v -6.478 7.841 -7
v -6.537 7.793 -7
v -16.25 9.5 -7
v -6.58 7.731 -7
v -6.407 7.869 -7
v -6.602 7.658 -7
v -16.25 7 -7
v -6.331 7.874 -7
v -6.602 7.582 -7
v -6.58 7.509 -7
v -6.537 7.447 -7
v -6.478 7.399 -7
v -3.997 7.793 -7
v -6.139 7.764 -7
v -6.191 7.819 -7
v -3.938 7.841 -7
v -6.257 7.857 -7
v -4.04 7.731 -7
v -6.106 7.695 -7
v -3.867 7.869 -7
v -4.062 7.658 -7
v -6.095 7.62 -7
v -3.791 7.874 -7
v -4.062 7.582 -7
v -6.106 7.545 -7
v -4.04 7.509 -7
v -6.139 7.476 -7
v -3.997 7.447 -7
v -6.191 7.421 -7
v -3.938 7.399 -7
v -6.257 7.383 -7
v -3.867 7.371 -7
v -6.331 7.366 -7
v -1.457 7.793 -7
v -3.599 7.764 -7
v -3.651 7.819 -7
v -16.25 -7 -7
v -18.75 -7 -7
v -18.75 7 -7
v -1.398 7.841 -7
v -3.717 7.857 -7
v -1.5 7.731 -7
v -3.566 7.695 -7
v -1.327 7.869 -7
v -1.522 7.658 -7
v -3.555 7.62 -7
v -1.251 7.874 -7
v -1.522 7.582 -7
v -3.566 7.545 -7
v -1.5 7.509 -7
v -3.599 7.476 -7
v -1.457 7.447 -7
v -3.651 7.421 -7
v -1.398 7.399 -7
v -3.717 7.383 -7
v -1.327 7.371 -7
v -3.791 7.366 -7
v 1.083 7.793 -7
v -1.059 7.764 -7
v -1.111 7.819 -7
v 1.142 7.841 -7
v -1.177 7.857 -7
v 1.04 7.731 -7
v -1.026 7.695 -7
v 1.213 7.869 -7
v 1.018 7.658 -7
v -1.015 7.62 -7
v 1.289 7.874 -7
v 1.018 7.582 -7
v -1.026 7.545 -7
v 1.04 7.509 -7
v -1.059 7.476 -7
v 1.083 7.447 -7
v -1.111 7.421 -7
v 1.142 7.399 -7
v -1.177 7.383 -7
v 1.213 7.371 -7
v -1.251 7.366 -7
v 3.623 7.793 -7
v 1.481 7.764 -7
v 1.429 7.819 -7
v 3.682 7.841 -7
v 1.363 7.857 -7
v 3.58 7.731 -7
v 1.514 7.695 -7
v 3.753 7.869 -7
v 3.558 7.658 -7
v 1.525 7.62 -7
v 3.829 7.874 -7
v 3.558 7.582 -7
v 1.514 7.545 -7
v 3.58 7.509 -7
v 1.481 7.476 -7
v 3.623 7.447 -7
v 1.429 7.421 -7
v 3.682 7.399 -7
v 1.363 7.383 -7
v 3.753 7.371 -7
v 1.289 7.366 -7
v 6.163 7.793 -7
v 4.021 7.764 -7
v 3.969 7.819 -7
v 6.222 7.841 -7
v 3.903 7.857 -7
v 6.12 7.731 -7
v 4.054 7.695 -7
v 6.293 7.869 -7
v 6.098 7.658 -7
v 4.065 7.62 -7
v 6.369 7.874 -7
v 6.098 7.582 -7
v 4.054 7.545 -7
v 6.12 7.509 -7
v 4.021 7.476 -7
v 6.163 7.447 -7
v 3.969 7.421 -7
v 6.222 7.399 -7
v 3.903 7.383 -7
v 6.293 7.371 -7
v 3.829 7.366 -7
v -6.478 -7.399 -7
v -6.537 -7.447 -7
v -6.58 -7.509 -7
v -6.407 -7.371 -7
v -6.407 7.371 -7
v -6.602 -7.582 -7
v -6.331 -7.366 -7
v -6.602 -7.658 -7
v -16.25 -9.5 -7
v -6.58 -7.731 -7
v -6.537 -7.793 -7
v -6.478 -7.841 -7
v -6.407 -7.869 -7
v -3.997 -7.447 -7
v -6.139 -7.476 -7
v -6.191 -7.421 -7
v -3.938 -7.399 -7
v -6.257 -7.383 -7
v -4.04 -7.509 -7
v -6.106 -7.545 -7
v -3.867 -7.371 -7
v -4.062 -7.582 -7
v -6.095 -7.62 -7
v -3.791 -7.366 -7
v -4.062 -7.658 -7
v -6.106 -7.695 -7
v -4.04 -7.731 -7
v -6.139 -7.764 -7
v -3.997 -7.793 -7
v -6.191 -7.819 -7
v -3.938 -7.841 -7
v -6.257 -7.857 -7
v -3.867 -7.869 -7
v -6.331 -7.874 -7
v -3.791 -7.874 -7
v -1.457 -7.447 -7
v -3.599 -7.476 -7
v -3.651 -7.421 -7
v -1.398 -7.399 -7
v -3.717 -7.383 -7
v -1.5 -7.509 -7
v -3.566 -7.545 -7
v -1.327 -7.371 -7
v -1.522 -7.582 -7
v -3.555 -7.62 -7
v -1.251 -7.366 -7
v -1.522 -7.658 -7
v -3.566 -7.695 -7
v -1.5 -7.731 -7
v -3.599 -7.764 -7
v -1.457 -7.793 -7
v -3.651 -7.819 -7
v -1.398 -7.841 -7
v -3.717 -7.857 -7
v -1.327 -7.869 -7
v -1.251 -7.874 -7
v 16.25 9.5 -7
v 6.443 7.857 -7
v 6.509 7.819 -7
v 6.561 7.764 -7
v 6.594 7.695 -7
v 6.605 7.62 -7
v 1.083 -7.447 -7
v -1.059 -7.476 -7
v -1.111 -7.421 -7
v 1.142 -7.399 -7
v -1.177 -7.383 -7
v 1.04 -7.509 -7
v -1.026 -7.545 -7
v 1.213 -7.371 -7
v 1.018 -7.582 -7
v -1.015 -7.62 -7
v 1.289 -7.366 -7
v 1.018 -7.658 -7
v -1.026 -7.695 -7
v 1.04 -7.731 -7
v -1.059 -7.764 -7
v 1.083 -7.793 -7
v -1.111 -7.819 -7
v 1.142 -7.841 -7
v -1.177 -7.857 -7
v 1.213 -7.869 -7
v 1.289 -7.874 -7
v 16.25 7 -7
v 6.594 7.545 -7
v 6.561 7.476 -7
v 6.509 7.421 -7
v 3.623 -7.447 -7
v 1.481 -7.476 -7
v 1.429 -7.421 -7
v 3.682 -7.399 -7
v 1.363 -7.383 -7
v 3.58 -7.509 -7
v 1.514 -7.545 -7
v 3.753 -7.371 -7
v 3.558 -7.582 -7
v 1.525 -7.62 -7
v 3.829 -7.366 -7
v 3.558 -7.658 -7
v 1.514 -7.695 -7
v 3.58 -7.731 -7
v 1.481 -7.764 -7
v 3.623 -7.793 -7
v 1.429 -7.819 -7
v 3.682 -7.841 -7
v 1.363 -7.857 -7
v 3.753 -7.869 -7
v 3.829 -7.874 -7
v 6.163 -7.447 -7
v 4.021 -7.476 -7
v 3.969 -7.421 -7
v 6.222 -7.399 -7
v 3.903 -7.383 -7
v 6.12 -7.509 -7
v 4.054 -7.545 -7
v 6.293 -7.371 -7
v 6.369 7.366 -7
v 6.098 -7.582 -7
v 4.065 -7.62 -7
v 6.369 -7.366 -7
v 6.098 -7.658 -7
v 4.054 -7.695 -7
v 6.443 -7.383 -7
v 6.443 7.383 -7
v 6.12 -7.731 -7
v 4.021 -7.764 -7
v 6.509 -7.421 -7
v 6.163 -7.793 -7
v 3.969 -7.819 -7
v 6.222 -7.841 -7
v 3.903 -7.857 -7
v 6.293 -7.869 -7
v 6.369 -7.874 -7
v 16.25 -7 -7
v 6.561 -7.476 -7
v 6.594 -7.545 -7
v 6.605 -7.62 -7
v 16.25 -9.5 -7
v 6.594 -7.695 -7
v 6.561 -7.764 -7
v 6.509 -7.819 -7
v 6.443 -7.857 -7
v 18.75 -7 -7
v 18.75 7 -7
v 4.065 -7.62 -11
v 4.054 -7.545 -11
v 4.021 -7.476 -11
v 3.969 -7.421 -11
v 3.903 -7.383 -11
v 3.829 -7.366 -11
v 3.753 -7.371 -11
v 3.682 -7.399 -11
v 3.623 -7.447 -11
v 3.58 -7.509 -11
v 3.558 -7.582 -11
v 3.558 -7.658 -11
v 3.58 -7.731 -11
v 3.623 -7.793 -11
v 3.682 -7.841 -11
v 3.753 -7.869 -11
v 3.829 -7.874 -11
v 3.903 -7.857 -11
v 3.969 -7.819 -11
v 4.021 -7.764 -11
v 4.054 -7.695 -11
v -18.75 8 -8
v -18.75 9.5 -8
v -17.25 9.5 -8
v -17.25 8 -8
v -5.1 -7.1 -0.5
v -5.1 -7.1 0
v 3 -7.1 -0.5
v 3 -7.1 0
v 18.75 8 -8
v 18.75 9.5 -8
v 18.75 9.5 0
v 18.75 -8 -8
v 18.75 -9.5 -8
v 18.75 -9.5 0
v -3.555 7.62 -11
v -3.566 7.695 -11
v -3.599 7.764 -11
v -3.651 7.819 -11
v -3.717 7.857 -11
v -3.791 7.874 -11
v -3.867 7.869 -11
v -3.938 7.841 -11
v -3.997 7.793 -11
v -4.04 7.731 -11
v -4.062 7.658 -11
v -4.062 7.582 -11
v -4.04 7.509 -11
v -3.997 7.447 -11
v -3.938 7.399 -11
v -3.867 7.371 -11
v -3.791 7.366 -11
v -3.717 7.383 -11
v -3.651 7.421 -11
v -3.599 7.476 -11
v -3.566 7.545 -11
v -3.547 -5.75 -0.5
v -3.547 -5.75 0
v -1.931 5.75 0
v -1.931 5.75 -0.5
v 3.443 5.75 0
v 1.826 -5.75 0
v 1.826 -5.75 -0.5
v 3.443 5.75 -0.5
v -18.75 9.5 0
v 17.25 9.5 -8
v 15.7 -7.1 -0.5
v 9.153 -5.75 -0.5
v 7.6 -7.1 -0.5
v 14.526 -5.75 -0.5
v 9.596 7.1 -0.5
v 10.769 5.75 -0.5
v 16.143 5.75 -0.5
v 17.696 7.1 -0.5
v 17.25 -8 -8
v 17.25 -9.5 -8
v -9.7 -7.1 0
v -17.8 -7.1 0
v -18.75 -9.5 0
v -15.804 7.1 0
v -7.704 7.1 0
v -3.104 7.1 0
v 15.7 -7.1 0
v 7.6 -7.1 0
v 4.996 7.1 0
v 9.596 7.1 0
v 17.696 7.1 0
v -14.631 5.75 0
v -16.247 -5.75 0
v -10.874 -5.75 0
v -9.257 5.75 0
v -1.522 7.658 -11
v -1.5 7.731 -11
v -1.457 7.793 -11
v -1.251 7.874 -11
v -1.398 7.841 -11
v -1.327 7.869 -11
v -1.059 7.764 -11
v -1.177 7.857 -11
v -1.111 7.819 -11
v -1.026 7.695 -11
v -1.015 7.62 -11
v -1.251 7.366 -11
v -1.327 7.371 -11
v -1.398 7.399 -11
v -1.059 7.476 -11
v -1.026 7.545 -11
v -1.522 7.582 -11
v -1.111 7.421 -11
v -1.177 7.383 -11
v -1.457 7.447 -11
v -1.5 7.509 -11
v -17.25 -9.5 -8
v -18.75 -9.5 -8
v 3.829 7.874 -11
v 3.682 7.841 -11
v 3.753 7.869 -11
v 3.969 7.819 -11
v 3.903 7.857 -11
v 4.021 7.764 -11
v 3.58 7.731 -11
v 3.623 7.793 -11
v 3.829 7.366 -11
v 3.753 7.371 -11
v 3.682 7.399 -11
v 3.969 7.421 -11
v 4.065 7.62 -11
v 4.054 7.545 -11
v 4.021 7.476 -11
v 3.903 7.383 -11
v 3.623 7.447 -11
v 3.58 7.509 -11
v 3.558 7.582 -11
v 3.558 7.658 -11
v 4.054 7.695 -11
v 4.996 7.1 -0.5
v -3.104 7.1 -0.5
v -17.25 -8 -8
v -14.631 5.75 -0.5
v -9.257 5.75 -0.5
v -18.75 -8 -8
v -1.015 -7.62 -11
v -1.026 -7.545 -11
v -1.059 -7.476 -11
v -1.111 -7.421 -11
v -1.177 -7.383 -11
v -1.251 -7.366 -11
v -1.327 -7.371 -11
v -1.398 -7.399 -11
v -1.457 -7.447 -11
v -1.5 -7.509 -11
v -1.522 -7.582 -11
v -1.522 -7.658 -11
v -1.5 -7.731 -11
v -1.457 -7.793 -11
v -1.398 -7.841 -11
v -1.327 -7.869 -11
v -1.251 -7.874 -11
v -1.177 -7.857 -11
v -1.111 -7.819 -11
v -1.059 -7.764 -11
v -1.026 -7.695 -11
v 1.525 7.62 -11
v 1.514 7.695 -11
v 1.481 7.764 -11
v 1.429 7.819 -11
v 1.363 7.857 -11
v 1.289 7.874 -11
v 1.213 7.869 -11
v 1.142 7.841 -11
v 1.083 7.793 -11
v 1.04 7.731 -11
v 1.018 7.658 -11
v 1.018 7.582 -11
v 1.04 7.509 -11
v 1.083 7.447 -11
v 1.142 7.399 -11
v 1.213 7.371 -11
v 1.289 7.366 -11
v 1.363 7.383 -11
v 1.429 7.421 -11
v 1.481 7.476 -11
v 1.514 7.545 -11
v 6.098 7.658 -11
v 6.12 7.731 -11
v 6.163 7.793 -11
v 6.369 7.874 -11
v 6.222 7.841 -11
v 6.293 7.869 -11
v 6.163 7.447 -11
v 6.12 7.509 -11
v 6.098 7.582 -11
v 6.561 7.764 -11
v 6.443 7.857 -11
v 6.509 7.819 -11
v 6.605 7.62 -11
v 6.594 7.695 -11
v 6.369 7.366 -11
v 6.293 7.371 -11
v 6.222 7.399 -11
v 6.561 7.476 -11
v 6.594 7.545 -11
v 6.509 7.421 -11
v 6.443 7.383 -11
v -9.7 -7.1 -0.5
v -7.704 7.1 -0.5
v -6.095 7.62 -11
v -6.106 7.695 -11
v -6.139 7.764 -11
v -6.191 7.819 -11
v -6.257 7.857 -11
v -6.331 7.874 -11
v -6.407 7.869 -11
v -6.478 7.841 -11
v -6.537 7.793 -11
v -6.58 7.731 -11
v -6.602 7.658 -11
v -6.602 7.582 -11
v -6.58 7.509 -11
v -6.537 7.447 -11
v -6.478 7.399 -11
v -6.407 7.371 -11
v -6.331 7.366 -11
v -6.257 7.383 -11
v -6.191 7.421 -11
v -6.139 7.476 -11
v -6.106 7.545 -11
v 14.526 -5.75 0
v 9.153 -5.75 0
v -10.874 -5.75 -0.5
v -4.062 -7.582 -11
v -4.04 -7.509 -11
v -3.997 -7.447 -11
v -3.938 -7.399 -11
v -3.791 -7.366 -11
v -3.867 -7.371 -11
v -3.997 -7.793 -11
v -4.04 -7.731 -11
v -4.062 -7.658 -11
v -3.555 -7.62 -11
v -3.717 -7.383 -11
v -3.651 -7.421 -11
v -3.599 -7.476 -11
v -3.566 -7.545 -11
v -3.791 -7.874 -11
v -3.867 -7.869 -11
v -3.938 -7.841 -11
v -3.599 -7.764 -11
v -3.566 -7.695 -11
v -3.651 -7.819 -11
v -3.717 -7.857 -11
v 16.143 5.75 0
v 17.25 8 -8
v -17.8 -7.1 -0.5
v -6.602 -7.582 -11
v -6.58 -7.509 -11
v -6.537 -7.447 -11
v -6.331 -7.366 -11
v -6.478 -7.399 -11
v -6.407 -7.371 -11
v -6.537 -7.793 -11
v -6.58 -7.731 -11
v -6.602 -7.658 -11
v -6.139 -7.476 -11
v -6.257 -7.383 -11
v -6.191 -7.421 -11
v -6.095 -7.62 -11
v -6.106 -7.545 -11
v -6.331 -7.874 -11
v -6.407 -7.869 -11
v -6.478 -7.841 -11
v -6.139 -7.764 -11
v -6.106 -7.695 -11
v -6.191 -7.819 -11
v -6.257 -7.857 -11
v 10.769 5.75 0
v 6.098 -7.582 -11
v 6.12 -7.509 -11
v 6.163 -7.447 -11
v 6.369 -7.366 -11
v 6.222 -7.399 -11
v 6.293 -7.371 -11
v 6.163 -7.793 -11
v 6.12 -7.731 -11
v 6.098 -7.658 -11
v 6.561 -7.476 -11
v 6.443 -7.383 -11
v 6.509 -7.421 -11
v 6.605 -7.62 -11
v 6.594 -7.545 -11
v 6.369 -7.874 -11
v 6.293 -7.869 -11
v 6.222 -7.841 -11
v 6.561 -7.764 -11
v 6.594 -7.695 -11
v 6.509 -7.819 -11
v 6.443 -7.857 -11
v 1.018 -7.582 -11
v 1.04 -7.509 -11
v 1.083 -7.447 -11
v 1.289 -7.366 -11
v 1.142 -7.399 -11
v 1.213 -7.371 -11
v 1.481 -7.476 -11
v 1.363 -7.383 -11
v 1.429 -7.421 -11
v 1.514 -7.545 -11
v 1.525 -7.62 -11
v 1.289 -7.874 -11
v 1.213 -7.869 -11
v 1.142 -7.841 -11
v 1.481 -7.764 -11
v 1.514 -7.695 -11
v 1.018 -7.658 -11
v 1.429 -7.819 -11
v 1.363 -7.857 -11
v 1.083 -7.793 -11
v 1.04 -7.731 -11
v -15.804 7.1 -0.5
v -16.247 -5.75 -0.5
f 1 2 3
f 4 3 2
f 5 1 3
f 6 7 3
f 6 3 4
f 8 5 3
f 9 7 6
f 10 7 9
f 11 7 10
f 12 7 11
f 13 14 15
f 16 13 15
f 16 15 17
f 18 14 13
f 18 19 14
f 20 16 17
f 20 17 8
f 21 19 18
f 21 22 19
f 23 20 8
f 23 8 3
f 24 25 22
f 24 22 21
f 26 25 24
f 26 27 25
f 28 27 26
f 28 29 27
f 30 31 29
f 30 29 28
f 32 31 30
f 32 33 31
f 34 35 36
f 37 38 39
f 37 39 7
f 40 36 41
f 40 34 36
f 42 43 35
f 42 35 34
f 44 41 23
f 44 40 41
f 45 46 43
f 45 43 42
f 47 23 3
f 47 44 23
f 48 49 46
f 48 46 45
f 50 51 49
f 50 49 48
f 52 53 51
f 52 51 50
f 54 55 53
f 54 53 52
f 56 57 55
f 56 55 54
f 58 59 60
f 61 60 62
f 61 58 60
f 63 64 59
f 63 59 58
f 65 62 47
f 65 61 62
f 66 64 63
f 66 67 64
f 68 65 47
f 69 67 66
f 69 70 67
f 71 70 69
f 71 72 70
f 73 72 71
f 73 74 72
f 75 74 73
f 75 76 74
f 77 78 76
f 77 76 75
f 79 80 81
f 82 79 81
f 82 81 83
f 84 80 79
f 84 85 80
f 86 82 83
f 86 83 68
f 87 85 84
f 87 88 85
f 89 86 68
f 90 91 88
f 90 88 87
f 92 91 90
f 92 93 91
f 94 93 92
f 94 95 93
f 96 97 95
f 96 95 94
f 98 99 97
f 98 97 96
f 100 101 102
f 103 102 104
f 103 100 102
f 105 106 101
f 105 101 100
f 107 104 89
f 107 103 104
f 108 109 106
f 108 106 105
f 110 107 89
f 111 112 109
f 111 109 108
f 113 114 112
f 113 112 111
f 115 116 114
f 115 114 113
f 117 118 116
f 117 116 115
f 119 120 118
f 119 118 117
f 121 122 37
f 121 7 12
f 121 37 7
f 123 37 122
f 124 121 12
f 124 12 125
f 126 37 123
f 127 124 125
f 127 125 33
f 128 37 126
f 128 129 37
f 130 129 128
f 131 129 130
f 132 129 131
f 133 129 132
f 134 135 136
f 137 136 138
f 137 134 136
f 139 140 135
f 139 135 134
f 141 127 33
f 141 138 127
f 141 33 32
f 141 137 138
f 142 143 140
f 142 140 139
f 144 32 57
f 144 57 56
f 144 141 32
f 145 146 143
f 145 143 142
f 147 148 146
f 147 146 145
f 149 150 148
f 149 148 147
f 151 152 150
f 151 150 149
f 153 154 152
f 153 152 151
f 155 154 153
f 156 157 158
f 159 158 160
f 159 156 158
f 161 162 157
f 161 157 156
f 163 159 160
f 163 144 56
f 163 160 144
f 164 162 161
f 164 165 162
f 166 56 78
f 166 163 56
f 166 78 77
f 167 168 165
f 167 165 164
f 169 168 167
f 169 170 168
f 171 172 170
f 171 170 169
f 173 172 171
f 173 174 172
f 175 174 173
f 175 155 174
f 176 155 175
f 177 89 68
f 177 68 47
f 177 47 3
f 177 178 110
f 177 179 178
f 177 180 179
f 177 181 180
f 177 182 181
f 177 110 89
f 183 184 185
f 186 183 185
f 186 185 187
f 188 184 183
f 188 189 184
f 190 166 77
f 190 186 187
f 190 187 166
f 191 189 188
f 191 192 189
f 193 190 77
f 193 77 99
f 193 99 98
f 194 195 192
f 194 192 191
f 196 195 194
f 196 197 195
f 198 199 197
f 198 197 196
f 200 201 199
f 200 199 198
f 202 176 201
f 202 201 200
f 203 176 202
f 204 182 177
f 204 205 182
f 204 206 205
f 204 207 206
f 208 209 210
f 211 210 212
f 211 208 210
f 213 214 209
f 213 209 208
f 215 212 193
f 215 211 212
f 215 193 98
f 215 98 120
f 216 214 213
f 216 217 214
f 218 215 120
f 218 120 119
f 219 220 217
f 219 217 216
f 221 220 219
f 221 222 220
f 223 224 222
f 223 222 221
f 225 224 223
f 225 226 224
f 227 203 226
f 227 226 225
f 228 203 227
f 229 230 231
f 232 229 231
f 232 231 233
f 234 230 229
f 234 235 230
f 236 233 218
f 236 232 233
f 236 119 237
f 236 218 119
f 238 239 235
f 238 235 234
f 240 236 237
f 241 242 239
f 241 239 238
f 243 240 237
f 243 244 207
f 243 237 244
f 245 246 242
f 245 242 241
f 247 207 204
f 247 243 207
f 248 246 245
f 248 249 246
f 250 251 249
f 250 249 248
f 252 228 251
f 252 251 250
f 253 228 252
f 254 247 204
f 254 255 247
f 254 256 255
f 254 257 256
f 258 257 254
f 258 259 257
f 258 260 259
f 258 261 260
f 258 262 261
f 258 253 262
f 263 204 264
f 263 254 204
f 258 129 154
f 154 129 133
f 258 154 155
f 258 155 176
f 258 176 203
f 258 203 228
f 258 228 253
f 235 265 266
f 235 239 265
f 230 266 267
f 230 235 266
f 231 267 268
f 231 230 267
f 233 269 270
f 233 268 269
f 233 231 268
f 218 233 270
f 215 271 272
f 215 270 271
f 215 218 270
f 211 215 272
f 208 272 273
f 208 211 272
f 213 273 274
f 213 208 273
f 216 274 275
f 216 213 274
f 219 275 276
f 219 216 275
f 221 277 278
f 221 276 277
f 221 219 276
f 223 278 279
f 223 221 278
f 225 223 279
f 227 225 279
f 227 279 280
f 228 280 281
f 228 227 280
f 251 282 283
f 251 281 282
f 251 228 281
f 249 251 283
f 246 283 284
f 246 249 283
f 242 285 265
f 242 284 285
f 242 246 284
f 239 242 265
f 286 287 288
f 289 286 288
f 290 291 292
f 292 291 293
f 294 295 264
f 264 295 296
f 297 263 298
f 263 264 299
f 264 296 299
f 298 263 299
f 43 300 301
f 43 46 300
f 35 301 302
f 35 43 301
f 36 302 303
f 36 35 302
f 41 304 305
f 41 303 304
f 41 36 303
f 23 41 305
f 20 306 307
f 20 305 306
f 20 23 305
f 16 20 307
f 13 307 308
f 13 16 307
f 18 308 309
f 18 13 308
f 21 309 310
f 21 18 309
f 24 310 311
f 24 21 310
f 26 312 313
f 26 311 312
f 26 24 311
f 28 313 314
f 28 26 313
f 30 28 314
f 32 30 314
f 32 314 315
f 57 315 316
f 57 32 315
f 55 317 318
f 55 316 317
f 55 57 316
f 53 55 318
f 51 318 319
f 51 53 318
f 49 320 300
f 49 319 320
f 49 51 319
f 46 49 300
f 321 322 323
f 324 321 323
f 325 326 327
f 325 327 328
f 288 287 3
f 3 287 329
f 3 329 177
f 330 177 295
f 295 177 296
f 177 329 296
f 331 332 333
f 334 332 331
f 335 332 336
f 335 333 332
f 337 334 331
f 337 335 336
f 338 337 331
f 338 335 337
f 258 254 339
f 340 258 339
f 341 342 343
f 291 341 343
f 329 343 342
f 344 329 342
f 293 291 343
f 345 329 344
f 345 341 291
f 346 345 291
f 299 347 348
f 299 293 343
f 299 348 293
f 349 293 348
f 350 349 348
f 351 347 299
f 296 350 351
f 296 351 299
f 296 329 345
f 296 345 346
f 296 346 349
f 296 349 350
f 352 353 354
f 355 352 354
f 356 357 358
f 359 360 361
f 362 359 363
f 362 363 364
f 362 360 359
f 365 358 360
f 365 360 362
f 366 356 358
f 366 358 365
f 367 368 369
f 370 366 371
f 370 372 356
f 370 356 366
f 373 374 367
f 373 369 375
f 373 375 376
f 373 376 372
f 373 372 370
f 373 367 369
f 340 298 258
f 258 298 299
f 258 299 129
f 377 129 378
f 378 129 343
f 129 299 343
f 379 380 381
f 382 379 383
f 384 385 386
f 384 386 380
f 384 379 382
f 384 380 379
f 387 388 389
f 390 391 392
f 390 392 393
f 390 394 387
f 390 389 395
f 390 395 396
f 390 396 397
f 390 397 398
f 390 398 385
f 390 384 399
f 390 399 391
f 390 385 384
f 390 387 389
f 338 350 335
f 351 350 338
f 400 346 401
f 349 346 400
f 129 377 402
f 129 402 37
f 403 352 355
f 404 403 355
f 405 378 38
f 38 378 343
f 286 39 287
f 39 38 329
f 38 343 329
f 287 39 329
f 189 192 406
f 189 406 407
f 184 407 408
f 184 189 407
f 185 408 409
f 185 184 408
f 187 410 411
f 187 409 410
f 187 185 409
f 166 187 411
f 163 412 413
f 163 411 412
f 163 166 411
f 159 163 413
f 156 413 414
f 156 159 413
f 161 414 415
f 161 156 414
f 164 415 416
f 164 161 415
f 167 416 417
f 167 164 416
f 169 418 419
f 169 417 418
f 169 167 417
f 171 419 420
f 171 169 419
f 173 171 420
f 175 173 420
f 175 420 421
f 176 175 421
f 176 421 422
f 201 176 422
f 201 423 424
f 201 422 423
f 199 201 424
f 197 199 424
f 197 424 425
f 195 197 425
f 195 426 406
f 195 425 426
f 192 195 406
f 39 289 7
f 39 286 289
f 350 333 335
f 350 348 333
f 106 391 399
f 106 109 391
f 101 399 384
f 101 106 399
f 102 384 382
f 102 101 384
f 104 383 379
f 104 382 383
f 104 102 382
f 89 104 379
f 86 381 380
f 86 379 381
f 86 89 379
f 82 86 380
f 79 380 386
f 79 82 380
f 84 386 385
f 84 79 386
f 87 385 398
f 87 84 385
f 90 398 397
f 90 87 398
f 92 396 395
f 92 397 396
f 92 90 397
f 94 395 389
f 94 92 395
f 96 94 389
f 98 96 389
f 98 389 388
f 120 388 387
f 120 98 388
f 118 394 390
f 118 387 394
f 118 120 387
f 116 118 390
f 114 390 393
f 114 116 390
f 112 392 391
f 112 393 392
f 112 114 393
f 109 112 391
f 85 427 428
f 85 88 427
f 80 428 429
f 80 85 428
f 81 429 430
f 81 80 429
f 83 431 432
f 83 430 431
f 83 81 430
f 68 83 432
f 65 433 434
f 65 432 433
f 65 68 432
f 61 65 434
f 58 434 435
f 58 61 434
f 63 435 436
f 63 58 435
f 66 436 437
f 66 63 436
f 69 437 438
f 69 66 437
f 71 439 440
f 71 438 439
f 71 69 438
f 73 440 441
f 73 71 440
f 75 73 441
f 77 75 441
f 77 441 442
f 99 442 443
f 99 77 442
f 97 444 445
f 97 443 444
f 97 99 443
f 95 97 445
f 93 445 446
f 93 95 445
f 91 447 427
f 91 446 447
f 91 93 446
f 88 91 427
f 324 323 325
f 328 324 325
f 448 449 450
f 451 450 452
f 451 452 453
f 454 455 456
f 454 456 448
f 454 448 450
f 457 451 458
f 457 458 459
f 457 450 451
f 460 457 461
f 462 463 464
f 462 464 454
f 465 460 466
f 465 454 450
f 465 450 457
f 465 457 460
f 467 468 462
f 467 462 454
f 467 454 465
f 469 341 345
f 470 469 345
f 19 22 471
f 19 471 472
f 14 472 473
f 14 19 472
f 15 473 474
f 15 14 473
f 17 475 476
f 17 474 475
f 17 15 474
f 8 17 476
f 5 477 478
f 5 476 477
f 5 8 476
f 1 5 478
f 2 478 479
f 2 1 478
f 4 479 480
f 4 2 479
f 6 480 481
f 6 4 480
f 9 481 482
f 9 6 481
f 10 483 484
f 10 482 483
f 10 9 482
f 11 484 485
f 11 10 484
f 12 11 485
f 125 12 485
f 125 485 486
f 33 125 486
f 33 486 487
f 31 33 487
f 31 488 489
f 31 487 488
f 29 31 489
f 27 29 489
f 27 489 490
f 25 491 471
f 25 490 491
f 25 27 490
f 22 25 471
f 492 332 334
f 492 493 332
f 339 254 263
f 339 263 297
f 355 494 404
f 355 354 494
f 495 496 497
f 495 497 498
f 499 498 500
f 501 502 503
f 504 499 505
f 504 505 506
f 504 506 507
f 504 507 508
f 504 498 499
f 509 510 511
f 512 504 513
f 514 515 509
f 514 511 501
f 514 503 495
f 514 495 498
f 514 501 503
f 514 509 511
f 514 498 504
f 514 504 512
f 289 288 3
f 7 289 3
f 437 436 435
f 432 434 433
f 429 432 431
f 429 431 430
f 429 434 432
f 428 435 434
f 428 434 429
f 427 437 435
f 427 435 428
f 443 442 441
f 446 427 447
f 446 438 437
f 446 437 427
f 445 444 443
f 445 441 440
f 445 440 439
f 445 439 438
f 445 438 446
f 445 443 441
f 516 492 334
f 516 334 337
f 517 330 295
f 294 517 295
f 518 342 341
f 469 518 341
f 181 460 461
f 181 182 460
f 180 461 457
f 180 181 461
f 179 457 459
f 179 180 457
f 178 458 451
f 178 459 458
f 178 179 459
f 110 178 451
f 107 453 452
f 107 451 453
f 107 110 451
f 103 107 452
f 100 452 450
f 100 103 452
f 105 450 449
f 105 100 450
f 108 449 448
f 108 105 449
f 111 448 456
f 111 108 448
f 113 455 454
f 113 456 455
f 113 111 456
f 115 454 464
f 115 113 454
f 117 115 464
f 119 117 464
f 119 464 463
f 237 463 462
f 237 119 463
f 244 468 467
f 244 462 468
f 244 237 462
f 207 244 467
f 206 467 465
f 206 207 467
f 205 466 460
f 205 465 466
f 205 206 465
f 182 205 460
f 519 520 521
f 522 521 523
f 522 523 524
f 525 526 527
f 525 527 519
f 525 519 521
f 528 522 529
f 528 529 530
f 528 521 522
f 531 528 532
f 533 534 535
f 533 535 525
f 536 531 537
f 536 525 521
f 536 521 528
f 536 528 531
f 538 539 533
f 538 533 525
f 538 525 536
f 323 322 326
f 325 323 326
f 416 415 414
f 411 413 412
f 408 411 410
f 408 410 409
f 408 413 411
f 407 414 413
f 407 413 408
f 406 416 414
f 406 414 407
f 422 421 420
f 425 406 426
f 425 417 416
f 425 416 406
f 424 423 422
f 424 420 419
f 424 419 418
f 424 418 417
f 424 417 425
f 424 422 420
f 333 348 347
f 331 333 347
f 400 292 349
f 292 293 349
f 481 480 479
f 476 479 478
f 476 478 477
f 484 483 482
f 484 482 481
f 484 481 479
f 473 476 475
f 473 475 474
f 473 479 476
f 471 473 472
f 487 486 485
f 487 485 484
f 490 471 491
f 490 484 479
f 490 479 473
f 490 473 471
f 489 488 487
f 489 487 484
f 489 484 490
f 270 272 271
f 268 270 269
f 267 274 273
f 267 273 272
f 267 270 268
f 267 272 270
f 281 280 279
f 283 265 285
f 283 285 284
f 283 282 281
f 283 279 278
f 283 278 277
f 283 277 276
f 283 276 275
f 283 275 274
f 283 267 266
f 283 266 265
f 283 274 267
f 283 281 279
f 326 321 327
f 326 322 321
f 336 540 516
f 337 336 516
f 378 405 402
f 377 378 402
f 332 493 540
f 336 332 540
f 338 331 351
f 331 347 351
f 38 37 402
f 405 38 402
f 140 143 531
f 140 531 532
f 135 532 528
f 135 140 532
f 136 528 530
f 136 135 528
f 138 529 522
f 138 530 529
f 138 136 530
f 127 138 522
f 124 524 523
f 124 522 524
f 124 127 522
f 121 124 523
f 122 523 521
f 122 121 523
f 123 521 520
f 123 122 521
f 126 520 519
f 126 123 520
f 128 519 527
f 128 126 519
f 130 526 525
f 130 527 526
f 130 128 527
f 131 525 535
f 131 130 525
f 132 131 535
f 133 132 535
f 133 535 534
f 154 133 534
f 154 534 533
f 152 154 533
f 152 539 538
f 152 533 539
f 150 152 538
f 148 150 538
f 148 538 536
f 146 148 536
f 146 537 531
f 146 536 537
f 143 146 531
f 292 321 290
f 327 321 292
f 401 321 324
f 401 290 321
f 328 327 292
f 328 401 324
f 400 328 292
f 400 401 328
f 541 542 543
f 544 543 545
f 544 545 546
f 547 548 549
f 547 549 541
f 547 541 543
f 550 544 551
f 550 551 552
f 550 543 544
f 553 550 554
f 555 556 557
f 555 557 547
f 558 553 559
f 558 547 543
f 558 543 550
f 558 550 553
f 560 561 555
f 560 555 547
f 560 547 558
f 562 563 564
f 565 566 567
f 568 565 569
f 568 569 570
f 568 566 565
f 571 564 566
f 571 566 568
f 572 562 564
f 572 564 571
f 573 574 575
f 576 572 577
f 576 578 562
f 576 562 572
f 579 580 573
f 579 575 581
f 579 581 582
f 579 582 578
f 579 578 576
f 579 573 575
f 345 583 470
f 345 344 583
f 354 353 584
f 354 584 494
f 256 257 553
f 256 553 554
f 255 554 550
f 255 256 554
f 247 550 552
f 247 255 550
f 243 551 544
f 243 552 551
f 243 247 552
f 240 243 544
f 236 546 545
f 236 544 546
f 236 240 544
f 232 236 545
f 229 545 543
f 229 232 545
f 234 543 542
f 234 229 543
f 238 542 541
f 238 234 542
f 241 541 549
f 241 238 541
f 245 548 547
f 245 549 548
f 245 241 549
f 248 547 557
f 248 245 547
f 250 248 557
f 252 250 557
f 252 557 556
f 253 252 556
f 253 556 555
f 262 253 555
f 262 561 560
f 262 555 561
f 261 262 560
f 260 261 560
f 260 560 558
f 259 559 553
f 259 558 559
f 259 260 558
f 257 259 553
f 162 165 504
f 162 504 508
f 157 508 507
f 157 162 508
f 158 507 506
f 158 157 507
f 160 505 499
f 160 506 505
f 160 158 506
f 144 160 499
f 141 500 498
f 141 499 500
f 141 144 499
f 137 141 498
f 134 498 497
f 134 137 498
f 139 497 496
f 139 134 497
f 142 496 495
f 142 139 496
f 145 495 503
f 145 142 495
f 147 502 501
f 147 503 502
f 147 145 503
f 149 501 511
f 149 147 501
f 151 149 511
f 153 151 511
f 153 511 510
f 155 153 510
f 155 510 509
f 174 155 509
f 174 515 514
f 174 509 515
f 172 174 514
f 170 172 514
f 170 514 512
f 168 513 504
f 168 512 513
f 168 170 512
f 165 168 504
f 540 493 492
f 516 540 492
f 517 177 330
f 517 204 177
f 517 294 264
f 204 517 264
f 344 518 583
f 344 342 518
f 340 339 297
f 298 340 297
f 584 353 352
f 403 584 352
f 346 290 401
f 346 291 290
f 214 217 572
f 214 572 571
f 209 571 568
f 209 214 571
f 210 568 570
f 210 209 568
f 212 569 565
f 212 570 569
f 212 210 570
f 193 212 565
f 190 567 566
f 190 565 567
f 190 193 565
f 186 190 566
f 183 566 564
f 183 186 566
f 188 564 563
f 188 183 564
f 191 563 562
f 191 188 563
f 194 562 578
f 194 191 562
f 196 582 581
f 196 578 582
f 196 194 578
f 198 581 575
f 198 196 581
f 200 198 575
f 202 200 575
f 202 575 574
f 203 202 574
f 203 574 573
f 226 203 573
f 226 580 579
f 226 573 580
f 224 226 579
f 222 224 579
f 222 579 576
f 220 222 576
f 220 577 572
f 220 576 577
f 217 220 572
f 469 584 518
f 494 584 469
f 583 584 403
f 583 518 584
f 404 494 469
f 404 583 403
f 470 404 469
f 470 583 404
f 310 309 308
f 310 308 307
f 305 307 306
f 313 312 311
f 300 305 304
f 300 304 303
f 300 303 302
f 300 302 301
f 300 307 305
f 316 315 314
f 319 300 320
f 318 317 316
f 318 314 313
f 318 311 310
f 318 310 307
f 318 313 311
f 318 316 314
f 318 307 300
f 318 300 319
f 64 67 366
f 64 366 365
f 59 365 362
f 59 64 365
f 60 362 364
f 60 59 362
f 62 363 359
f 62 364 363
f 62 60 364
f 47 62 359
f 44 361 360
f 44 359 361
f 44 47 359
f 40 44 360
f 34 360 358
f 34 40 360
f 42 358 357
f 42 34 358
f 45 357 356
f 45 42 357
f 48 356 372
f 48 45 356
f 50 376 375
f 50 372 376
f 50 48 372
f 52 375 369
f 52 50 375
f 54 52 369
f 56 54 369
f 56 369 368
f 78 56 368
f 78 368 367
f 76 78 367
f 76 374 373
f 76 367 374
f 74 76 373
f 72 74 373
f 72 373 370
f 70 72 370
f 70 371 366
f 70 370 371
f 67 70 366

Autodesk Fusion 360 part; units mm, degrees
sketch "Sketch1" plane through (0, 0, 0) normal (0, 0, 1) x (1, 0, 0)
  line L0 (18.75, -9.5) -> (-18.75, -9.5)
  line L1 (-18.75, -9.5) -> (-18.75, 9.5)
  line L2 (-18.75, 9.5) -> (18.75, 9.5)
  line L3 (18.75, 9.5) -> (18.75, -9.5)
  line L4 (18.75, -9.5) -> (-18.75, 9.5) construction
  line L5 (-18.75, -9.5) -> (18.75, 9.5) construction
  line L6 (0, 9.5) -> (0, -9.5) construction
  line L7 (12.7, 9.5) -> (12.7, -9.5) construction
  line L8 (-12.7, 9.5) -> (-12.7, -9.5) construction
  line L9 (-5.1, -7.1) -> (3, -7.1)
  line L10 (-3.1043, 7.1) -> (4.9957, 7.1)
  line L11 (-5.1, -7.1) -> (-3.1043, 7.1)
  line L12 (3, -7.1) -> (4.9957, 7.1)
  line L13 (-1.9308, 5.75) -> (3.4427, 5.75)
  line L14 (1.8265, -5.75) -> (3.4427, 5.75)
  line L15 (-3.547, -5.75) -> (1.8265, -5.75)
  line L16 (-3.547, -5.75) -> (-1.9308, 5.75)
  line L17 (-17.8, -7.1) -> (-15.8043, 7.1)
  line L18 (-16.247, -5.75) -> (-14.6308, 5.75)
  line L19 (-17.8, -7.1) -> (-9.7, -7.1)
  line L20 (-16.247, -5.75) -> (-10.8735, -5.75)
  line L21 (-10.8735, -5.75) -> (-9.2573, 5.75)
  line L22 (-9.7, -7.1) -> (-7.7043, 7.1)
  line L23 (-14.6308, 5.75) -> (-9.2573, 5.75)
  line L24 (-15.8043, 7.1) -> (-7.7043, 7.1)
  line L25 (7.6, -7.1) -> (9.5957, 7.1)
  line L26 (9.153, -5.75) -> (10.7692, 5.75)
  line L27 (7.6, -7.1) -> (15.7, -7.1)
  line L28 (9.153, -5.75) -> (14.5265, -5.75)
  line L29 (14.5265, -5.75) -> (16.1427, 5.75)
  line L30 (15.7, -7.1) -> (17.6957, 7.1)
  line L31 (10.7692, 5.75) -> (16.1427, 5.75)
  line L32 (9.5957, 7.1) -> (17.6957, 7.1)
  dimension "d1" = 37.5
  dimension "d2" = 19
  dimension "d3" = 12.7
  dimension "d4" = 12.7
  dimension "d5" = 8.1
  dimension "d6" = 3
  dimension "d7" = 2.4
  dimension "d8" = 8.1
  dimension "d9" = 2.4
  dimension "d10" = 82
  dimension "d11" = -1.35
  dimension "d14" = 12.7
  dimension "d15" = 0
extrude "Extrude1" add sketch "Sketch1" against normal blind 8 contours L0 L1 L2 L3 | L9 L10 L11 L12 | L13 L14 L15 L16 | L17 L19 L22 L24 | L18 L20 L21 L23 | L25 L27 L30 L32 | L26 L28 L29 L31
extrude "Extrude2" cut sketch "Sketch1" against normal blind 0.5 contours L9 L10 L11 L12 | L17 L19 L22 L24 | L25 L27 L30 L32
sketch "Sketch2" plane through (0, -9.5, 0) normal (0, -1, 0) x (1, 0, 0)
  line L0 (18.75, 0) -> (-18.75, 0)
  line L1 (-18.75, 0) -> (-18.75, -8)
  line L2 (-18.75, -8) -> (18.75, -8)
  line L3 (18.75, -8) -> (18.75, 0)
  line L4 (-17.25, -8) -> (-16.25, -7)
  line L5 (-16.25, -7) -> (16.25, -7)
  line L6 (16.25, -7) -> (17.25, -8)
  dimension "d20" = 1
  dimension "d21" = 1.5
  dimension "d22" = 1.5
  dimension "d23" = 45
extrude "Extrude3" cut sketch "Sketch2" against normal up to surface (19 mm away) contours L2 L4 L5 L6
sketch "Sketch3" plane through (-18.75, 0, 0) normal (-1, 0, 0) x (0, -1, 0)
  line L0 (9.5, 0) -> (-9.5, 0)
  line L1 (-9.5, 0) -> (-9.5, -8)
  line L2 (-9.5, -8) -> (9.5, -8)
  line L3 (9.5, -8) -> (9.5, 0)
  line L4 (-8, -8) -> (-7, -7)
  line L5 (-7, -7) -> (7, -7)
  line L6 (7, -7) -> (8, -8)
  dimension "d26" = 45
  dimension "d27" = 1
  dimension "d28" = 1.5
  dimension "d29" = 1.5
extrude "Extrude4" cut sketch "Sketch3" against normal up to surface (37.5 mm away) contours L2 L4 L5 L6
sketch "Sketch4" plane through (0, 0, -7) normal (0, 0, -1) x (1, 0, 0)
  line L0 (16.25, 7) -> (16.25, 9.5)
  line L1 (16.25, 9.5) -> (-16.25, 9.5)
  line L2 (-16.25, 9.5) -> (-16.25, 7)
  line L3 (-16.25, 7) -> (-18.75, 7)
  line L4 (-18.75, 7) -> (-18.75, -7)
  line L5 (-18.75, -7) -> (-16.25, -7)
  line L6 (-16.25, -7) -> (-16.25, -9.5)
  line L7 (-16.25, -9.5) -> (16.25, -9.5)
  line L8 (16.25, -9.5) -> (16.25, -7)
  line L9 (16.25, -7) -> (18.75, -7)
  line L10 (18.75, -7) -> (18.75, 7)
  line L11 (18.75, 7) -> (16.25, 7)
  circle A0 centre (-6.35, 7.62) radius 0.255
  circle A1 centre (-3.81, 7.62) radius 0.255
  circle A2 centre (-1.27, 7.62) radius 0.255
  circle A3 centre (1.27, 7.62) radius 0.255
  circle A4 centre (3.81, 7.62) radius 0.255
  circle A5 centre (6.35, 7.62) radius 0.255
  circle A6 centre (-6.35, -7.62) radius 0.255
  circle A7 centre (-3.81, -7.62) radius 0.255
  circle A8 centre (-1.27, -7.62) radius 0.255
  circle A9 centre (1.27, -7.62) radius 0.255
  circle A10 centre (3.81, -7.62) radius 0.255
  circle A11 centre (6.35, -7.62) radius 0.255
  dimension "d32" = 0.51
  dimension "d33" = 6.35
  dimension "d34" = 7.62
  dimension "d37" = 12.7
  dimension "d38" = -15.24
extrude "Extrude5" add sketch "Sketch4" along normal blind 4 contours A0 | A1 | A2 | A3 | A4 | A5 | A6 | A7 | A8 | A9 | A10 | A11
equation "d4 = d3"
equation "d7 = ( ( 19 - 14.2 ) / 2 ) * 1 mm"
equation "d8 = d5"
equation "d9 = d7"
equation "d22 = d21"
equation "d34 = ( 15.24 / 2 ) * 1 mm"
